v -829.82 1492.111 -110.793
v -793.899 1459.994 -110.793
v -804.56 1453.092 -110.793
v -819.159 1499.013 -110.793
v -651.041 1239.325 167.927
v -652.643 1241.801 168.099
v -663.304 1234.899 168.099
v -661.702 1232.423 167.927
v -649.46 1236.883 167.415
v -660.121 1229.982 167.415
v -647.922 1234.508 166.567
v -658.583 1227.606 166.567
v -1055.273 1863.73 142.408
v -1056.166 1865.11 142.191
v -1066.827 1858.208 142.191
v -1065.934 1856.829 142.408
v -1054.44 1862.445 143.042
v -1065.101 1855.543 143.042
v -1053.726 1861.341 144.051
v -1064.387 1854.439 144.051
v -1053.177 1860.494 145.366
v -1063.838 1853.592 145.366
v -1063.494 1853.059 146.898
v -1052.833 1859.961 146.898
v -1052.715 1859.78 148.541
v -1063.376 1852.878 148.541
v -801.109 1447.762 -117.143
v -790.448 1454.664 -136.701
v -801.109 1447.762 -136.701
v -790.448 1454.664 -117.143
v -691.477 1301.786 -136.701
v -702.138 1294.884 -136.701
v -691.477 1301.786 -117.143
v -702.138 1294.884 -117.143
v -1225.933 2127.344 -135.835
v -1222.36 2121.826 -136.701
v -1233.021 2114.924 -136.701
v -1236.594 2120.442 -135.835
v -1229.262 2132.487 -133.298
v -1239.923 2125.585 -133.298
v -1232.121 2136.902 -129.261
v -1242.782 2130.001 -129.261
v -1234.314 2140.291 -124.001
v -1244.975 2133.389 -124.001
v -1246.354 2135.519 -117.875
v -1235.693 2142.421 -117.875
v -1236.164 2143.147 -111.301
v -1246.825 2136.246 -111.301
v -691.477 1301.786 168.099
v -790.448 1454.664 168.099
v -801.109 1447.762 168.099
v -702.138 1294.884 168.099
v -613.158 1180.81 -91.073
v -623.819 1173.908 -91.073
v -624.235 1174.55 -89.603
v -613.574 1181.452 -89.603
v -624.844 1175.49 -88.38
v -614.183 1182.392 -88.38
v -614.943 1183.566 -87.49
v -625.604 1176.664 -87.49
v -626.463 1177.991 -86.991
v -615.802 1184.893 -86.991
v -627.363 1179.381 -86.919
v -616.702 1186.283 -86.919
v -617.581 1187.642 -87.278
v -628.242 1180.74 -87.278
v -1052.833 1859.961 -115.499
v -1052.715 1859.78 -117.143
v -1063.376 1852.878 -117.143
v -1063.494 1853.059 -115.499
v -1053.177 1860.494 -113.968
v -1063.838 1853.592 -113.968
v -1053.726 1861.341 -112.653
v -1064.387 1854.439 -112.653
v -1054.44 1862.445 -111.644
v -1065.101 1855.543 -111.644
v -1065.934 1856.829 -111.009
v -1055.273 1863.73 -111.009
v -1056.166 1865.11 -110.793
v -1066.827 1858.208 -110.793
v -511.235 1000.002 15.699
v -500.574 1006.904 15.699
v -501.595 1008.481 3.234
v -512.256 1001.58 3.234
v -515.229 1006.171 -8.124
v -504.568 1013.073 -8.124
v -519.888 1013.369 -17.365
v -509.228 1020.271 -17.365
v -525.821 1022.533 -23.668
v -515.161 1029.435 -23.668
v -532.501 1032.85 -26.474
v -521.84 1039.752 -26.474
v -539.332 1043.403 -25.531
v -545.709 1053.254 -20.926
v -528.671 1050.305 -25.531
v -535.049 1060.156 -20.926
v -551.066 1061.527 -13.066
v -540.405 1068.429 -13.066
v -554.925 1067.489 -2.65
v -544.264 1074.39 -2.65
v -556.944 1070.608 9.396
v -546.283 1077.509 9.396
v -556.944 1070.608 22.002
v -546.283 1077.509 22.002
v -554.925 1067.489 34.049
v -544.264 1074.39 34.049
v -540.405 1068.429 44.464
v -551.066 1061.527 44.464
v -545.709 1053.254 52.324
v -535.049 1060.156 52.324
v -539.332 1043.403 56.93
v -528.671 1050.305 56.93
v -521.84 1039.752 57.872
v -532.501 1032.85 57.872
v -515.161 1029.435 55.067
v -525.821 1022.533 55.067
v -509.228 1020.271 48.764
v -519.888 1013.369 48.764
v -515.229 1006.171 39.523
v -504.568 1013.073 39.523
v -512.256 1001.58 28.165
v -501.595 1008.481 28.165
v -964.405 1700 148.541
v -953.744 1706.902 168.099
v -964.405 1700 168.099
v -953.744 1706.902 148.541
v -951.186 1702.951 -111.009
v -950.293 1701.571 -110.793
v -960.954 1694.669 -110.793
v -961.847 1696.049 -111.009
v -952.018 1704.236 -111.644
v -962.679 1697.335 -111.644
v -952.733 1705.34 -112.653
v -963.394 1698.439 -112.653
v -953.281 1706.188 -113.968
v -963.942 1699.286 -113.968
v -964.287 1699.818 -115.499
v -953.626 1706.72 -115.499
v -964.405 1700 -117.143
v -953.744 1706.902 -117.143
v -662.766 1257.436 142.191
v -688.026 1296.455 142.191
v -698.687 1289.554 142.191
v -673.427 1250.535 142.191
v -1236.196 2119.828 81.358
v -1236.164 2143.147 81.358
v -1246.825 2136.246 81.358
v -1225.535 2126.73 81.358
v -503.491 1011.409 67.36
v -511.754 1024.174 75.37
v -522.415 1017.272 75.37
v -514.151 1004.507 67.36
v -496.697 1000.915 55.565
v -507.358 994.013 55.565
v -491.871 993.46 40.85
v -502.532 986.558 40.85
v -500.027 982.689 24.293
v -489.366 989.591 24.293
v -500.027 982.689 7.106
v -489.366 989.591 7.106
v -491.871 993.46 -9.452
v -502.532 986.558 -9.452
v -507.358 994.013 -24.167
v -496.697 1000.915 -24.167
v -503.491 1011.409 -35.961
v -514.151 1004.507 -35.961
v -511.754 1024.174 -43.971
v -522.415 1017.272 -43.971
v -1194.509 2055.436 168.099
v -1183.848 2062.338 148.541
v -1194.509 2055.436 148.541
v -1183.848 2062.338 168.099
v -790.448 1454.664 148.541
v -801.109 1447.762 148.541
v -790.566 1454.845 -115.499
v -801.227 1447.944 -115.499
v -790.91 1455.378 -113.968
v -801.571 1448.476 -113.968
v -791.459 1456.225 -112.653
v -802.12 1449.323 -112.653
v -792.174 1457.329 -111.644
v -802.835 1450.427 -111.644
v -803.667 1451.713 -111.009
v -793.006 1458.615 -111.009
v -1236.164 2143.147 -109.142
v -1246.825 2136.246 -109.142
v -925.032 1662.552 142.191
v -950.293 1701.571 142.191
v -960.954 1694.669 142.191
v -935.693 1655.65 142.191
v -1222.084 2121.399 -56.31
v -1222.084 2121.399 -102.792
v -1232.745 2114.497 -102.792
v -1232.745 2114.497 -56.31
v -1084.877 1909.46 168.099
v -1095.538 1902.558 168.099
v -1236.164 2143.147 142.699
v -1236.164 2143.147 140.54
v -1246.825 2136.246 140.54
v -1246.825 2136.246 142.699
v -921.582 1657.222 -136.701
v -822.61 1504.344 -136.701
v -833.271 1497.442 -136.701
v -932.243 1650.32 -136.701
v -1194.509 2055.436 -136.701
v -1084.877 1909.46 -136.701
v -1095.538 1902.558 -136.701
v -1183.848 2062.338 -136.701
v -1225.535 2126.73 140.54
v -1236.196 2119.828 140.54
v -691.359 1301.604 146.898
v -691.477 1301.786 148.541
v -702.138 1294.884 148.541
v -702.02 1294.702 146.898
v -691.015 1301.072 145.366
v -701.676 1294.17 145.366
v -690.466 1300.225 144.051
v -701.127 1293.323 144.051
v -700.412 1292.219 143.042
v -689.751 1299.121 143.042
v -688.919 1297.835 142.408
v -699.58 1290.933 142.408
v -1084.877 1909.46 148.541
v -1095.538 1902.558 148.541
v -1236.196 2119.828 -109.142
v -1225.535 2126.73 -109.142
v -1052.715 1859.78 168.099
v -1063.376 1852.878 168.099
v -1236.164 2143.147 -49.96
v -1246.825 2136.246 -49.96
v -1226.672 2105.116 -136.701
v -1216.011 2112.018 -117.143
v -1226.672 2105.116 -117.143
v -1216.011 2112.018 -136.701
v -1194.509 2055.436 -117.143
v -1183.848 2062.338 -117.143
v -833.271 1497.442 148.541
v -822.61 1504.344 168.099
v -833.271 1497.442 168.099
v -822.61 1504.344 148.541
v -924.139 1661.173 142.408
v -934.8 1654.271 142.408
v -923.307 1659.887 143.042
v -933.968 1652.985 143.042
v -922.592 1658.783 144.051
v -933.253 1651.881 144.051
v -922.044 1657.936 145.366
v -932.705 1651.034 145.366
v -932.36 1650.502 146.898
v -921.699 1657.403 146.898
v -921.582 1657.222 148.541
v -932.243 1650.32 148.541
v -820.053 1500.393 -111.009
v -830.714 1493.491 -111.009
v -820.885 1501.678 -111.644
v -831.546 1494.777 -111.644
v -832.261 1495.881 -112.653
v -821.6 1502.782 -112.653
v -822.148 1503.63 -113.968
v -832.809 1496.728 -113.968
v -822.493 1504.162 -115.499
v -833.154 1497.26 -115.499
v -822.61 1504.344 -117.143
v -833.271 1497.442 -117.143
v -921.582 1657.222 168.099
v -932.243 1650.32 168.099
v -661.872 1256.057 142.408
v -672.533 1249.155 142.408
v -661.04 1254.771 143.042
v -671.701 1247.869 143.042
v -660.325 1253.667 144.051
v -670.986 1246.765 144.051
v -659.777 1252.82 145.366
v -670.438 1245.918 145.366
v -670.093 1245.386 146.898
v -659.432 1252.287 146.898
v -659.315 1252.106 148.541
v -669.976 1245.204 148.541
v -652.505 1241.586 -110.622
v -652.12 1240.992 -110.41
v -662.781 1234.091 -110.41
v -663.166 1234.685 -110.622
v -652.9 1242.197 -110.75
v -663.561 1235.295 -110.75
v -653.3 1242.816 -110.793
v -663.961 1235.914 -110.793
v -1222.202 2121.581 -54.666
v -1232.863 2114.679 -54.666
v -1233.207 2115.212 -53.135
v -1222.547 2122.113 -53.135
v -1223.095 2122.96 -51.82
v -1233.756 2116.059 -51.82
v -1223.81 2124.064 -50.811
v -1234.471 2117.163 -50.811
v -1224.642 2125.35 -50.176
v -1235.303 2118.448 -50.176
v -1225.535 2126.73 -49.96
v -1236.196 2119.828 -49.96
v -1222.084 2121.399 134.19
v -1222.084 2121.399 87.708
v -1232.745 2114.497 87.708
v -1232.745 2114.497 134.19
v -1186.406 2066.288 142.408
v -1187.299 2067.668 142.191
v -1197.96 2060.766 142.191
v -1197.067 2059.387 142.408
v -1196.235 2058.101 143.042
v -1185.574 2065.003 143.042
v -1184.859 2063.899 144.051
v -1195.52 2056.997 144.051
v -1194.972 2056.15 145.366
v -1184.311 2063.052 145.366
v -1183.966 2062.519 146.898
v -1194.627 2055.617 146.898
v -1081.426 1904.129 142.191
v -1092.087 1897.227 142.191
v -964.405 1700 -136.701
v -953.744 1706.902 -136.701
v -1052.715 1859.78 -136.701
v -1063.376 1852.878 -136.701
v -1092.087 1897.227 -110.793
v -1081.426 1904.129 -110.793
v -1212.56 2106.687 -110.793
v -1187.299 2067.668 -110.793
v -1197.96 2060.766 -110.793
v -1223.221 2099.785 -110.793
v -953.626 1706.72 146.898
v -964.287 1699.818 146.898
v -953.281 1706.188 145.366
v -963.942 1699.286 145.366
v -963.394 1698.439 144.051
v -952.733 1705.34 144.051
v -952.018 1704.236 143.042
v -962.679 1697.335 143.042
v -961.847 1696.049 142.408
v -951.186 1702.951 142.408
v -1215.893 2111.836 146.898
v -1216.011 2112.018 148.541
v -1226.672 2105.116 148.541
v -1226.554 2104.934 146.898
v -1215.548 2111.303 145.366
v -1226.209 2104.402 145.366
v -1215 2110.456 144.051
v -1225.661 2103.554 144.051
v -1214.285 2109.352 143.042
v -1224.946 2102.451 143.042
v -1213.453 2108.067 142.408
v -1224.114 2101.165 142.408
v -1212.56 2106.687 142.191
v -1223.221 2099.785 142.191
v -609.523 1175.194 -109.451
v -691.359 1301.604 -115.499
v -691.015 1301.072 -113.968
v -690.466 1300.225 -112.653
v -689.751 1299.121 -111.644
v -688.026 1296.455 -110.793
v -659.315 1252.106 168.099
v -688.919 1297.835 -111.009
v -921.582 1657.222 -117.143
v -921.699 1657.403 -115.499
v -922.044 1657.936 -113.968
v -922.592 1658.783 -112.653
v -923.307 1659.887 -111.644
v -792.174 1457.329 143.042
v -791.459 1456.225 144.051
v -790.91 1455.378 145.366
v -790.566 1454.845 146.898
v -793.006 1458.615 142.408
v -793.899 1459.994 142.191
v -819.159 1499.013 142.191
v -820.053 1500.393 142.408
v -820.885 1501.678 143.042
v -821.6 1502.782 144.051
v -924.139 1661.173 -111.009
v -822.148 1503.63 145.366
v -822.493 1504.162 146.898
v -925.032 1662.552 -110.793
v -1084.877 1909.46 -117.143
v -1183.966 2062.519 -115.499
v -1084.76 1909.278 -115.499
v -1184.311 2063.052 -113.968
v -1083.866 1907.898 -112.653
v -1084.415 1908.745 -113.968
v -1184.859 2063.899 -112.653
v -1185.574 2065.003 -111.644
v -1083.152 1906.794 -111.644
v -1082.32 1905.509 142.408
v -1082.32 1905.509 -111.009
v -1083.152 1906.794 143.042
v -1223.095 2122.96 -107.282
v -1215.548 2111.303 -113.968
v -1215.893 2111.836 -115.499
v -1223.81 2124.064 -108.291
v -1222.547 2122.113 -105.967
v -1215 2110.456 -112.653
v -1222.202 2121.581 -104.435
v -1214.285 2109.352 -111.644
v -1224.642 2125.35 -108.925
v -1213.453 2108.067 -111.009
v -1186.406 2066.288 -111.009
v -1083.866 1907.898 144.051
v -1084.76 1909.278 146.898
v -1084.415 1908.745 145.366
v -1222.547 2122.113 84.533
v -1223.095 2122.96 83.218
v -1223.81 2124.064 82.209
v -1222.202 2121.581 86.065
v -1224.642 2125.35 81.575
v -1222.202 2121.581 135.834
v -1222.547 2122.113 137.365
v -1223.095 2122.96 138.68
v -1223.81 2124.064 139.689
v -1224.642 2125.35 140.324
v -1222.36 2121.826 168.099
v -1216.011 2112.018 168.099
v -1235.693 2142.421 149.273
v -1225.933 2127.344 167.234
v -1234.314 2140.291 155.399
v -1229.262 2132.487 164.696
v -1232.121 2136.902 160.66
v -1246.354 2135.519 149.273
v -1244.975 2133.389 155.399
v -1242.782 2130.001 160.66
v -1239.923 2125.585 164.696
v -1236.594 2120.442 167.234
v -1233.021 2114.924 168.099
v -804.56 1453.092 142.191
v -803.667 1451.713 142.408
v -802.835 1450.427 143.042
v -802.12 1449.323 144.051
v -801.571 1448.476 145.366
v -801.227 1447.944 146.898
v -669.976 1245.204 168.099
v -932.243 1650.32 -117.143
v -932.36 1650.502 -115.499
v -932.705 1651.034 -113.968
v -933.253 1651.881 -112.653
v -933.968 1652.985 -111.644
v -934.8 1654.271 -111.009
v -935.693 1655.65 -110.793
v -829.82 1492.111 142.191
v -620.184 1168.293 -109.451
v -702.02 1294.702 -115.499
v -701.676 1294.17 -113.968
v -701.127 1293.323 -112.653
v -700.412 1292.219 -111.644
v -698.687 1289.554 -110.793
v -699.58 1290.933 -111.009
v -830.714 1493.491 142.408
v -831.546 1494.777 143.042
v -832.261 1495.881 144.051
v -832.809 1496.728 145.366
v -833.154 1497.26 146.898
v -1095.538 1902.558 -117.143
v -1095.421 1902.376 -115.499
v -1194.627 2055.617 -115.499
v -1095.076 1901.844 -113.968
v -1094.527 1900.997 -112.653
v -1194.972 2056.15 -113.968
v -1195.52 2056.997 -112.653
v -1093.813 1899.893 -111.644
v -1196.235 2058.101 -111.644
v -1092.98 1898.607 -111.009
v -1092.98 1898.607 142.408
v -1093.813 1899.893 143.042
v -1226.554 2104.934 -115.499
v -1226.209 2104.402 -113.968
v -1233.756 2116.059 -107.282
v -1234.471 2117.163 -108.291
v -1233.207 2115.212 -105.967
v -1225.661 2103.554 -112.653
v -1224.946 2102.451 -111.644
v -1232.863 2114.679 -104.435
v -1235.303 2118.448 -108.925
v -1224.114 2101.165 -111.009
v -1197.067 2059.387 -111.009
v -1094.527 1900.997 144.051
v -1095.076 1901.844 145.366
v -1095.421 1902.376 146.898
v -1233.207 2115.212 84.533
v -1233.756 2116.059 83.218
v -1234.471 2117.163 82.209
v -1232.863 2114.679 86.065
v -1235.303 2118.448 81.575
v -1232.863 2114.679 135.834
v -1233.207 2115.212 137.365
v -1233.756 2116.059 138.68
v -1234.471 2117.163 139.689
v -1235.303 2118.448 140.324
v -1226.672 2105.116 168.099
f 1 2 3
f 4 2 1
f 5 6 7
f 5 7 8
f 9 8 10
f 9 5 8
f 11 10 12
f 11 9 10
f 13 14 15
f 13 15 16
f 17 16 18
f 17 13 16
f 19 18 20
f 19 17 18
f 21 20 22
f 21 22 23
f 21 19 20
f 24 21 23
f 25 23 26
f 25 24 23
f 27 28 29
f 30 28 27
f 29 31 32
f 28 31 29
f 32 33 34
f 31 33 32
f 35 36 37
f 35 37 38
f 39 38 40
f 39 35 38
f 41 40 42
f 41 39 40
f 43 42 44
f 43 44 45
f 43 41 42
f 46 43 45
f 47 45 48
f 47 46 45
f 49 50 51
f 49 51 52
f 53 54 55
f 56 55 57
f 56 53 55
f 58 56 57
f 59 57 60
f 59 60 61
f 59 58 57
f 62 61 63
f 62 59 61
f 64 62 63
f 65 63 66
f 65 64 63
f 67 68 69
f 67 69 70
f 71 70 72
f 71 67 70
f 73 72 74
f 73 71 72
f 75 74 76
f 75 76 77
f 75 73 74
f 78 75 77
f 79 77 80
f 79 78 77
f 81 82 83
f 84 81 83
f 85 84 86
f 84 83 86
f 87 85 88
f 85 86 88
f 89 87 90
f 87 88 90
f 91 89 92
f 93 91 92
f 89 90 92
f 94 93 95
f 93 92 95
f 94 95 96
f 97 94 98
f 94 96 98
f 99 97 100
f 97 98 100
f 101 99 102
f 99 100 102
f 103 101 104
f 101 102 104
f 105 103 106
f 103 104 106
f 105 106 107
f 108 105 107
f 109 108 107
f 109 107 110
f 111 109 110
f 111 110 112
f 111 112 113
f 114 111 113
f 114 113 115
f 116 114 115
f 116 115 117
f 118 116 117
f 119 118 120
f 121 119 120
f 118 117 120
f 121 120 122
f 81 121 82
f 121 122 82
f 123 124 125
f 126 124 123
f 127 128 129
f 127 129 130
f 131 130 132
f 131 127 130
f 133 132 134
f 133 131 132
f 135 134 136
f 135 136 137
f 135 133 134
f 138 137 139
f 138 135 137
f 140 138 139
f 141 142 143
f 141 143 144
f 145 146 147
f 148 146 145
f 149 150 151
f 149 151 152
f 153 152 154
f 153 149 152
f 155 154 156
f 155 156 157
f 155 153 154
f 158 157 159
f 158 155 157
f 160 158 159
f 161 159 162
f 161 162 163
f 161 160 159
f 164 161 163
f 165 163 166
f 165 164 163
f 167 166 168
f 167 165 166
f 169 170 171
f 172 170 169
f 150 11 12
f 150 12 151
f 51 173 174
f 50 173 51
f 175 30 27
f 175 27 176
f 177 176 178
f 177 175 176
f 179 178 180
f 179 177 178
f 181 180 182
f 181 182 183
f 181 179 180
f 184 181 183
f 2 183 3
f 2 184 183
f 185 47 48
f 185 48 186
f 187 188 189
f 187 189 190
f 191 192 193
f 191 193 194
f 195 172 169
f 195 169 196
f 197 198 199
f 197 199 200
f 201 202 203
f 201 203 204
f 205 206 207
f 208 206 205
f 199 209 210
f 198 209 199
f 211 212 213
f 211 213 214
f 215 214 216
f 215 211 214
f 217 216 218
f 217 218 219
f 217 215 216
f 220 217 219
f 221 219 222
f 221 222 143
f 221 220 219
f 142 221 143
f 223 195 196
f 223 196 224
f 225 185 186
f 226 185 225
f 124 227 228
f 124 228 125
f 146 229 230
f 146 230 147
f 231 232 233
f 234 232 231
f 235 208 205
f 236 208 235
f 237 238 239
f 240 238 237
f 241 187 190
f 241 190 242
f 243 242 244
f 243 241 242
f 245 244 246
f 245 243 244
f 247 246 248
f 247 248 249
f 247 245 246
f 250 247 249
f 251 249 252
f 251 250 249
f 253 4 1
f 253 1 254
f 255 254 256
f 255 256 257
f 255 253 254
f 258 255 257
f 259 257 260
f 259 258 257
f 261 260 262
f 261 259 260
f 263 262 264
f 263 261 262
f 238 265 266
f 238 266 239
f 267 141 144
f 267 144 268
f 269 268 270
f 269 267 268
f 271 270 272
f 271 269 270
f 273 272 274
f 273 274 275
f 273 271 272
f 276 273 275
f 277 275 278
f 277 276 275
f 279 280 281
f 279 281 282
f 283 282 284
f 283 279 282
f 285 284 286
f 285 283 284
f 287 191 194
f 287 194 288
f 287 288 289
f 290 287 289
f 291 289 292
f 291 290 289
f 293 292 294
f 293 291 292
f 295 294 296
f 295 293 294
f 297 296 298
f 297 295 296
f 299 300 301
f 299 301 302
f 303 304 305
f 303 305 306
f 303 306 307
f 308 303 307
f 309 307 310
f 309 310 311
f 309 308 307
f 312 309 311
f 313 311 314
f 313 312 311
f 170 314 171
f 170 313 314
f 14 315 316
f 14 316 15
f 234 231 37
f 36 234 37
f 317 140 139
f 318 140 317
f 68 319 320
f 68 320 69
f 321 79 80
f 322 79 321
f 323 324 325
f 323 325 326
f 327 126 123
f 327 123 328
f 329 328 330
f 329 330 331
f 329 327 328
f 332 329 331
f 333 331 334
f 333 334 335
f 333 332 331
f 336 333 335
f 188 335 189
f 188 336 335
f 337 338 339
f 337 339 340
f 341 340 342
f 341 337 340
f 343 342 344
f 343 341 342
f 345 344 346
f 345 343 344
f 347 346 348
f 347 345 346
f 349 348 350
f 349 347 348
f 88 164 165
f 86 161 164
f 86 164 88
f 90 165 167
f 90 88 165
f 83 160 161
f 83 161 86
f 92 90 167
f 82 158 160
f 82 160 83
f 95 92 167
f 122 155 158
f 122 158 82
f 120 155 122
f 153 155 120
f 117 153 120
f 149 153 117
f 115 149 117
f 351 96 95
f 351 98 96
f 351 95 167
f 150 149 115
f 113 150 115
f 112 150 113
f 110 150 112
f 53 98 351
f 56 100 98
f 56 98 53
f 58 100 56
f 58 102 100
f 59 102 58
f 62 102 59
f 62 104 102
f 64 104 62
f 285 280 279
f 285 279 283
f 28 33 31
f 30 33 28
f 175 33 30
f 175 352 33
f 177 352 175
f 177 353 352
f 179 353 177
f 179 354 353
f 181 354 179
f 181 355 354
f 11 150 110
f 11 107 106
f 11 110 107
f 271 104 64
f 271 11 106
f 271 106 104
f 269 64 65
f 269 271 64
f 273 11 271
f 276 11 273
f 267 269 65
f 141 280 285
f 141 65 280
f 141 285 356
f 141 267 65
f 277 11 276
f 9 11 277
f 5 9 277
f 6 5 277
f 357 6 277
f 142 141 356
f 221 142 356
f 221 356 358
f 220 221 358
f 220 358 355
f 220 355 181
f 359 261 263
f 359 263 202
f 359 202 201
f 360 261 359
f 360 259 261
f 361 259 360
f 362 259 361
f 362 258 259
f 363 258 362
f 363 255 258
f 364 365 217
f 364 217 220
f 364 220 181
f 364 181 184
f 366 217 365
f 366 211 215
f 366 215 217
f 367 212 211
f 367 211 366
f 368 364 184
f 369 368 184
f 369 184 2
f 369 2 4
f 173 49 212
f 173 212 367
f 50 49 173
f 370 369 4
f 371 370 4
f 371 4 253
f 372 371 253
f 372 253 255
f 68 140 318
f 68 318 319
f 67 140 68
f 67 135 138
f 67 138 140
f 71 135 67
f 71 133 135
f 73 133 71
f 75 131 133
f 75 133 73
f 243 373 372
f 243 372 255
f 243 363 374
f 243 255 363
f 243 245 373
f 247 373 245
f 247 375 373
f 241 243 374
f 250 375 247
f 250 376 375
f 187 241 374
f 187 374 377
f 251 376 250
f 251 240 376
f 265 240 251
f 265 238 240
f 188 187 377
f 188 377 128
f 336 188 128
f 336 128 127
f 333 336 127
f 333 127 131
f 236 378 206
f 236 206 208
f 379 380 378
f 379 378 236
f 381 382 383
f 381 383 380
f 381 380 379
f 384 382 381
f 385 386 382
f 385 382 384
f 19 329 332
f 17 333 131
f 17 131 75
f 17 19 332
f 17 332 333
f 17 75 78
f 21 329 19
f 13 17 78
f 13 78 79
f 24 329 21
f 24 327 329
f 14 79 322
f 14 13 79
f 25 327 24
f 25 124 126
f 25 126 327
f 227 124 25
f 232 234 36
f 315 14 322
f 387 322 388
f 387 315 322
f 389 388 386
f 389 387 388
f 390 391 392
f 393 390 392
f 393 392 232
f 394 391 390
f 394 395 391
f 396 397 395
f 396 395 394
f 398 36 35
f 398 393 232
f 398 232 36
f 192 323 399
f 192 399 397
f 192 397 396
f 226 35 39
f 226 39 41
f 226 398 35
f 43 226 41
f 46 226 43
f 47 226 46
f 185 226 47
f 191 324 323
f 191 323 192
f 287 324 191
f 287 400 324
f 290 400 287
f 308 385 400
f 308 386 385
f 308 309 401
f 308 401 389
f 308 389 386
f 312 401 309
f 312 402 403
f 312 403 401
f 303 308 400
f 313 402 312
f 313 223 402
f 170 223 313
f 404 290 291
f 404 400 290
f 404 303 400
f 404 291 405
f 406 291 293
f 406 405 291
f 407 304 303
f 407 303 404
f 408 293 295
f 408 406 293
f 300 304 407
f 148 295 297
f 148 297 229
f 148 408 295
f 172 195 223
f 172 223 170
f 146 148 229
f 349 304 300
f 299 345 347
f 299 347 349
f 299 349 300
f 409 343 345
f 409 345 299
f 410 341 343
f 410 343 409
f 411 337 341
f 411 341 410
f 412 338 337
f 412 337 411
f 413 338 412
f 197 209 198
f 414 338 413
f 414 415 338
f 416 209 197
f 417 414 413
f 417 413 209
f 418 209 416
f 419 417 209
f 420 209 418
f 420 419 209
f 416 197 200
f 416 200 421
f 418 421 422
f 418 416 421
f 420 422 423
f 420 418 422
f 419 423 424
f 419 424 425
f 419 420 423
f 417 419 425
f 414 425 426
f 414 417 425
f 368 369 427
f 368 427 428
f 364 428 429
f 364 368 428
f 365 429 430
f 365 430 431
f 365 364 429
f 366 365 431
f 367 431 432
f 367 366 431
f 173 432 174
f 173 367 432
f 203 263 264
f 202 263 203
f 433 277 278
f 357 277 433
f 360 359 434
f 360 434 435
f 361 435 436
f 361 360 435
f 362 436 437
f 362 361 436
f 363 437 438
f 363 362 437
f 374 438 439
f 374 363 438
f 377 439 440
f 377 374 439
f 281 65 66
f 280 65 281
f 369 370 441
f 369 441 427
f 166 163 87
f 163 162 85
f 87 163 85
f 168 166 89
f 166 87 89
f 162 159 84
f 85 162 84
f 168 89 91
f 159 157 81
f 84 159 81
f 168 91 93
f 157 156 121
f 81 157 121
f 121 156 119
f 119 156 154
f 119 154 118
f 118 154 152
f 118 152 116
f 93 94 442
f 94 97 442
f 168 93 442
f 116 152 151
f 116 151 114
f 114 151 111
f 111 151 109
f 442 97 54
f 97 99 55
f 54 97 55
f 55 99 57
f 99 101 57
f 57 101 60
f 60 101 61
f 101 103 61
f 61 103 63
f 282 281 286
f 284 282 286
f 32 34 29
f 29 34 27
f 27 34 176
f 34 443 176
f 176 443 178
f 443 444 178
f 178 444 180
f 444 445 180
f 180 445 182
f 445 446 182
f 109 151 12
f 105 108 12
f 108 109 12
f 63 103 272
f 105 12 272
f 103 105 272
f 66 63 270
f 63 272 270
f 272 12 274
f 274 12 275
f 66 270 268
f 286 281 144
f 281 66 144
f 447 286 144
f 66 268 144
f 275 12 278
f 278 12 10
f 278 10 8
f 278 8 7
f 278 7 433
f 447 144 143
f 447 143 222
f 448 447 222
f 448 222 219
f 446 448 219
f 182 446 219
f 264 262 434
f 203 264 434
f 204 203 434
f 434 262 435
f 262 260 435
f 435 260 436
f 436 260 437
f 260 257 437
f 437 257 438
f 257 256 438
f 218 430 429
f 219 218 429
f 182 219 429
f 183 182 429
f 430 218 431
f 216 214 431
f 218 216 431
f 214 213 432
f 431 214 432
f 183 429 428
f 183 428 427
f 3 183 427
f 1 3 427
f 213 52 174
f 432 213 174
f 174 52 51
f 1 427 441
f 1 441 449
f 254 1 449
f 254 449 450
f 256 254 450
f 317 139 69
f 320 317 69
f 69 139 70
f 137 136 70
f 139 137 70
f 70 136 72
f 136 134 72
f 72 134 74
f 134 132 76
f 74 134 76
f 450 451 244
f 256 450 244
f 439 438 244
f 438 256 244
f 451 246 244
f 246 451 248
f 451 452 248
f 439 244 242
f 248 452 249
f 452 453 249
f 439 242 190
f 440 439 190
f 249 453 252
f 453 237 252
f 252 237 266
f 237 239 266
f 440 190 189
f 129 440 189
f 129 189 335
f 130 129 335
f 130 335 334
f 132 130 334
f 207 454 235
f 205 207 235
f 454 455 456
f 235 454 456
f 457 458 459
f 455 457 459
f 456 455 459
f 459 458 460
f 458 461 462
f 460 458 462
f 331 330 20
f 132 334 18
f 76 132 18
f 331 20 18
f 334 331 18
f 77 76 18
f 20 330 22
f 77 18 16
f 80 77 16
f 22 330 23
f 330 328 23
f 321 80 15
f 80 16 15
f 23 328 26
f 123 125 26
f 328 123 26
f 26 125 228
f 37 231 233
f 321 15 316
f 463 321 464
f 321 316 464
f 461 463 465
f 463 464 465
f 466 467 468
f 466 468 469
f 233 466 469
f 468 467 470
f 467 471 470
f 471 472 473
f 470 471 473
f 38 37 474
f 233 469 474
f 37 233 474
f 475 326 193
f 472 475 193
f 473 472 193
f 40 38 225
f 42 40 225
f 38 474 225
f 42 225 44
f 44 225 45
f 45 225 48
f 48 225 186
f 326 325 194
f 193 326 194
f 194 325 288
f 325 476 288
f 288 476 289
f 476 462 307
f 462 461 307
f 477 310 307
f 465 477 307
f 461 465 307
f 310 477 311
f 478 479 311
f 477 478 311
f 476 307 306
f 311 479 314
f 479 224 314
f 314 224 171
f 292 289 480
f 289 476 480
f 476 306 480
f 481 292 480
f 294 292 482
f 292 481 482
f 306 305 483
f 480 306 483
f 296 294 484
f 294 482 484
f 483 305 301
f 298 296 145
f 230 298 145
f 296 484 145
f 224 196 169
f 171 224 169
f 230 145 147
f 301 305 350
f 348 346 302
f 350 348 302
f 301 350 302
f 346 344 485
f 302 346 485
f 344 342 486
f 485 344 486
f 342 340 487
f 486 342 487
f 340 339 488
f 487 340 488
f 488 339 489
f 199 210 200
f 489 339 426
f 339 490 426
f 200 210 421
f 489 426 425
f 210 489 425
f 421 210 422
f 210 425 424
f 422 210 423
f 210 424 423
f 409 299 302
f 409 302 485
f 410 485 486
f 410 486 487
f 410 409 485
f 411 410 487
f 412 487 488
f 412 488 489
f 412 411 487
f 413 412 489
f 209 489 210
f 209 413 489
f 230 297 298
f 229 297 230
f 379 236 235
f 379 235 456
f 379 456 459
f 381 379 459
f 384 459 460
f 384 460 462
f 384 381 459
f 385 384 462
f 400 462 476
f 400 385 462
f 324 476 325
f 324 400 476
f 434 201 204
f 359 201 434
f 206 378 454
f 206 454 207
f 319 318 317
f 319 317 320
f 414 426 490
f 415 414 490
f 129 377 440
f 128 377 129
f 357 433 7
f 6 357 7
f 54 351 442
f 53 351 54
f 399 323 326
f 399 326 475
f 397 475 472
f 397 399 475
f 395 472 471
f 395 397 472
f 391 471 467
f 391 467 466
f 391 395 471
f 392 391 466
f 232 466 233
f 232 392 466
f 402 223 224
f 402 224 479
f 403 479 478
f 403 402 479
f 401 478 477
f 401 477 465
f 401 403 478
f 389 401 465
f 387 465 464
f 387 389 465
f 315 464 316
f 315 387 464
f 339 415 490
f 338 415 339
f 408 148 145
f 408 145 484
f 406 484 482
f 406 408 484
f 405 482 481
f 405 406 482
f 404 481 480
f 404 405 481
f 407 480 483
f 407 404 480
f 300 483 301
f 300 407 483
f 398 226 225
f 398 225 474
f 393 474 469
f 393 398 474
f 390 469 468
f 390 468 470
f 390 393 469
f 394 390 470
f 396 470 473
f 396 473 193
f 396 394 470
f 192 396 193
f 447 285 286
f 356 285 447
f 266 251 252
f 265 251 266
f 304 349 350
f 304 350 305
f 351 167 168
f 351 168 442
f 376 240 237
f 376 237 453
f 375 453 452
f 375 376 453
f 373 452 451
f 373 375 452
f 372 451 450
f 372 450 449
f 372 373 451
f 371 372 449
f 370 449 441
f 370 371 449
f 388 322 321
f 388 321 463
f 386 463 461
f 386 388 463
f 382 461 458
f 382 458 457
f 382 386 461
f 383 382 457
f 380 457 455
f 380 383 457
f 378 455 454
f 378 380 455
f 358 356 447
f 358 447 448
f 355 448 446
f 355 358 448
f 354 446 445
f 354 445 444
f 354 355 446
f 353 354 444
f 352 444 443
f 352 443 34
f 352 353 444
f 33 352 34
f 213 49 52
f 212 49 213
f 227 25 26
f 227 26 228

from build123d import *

# Parameters (mm, degrees)
SKETCH1_R           = 42.291
BOSS_EXTRUDE1_DEPTH = 12.7


with BuildPart() as part:
    # Sketch1 → Boss-Extrude1 (new body)
    with BuildSketch(Plane(origin=(106.603890681, 69.014006689, 0), x_dir=(-0.543445635, 0.839444365, 0), z_dir=(0.839444365, 0.543445635, 0))):
        with BuildLine():
            Line((2433.75688, -117.142768), (2433.75688, -136.700768))
            Line((2433.75688, -136.700768), (2445.44088, -136.700768))
            ThreePointArc((2445.44088, -136.700768), (2463.401392242, -129.261280242), (2470.84088, -111.300768))
            Line((2470.84088, -111.300768), (2470.84088, -109.141768))
            Line((2470.84088, -109.141768), (2451.28288, -109.141768))
            ThreePointArc((2451.28288, -109.141768), (2446.792751939, -107.28189606), (2444.93288, -102.791768))
            Line((2444.93288, -102.791768), (2444.93288, -56.309772))
            ThreePointArc((2444.93288, -56.309772), (2446.792751939, -51.819643939), (2451.28288, -49.959772))
            Line((2451.28288, -49.959772), (2470.84088, -49.959772))
            Line((2470.84088, -49.959772), (2470.84088, 81.358228))
            Line((2470.84088, 81.358228), (2451.28288, 81.358228))
            ThreePointArc((2451.28288, 81.358228), (2446.792751939, 83.21809994), (2444.93288, 87.708228))
            Line((2444.93288, 87.708228), (2444.93288, 134.190232))
            ThreePointArc((2444.93288, 134.190232), (2446.792751939, 138.680360061), (2451.28288, 140.540232))
            Line((2451.28288, 140.540232), (2470.84088, 140.540232))
            Line((2470.84088, 140.540232), (2470.84088, 142.699232))
            ThreePointArc((2470.84088, 142.699232), (2463.401392242, 160.659744242), (2445.44088, 168.099232))
            Line((2445.44088, 168.099232), (2433.75688, 168.099232))
            Line((2433.75688, 168.099232), (2433.75688, 148.541232))
            ThreePointArc((2433.75688, 148.541232), (2431.897008061, 144.051103939), (2427.40688, 142.191232))
            Line((2427.40688, 142.191232), (2380.92488, 142.191232))
            ThreePointArc((2380.92488, 142.191232), (2376.434751939, 144.051103939), (2374.57488, 148.541232))
            Line((2374.57488, 148.541232), (2374.57488, 168.099232))
            Line((2374.57488, 168.099232), (2192.45688, 168.099232))
            Line((2192.45688, 168.099232), (2192.45688, 148.541232))
            ThreePointArc((2192.45688, 148.541232), (2190.597008061, 144.051103939), (2186.10688, 142.191232))
            Line((2186.10688, 142.191232), (2139.62488, 142.191232))
            ThreePointArc((2139.62488, 142.191232), (2135.134751939, 144.051103939), (2133.27488, 148.541232))
            Line((2133.27488, 148.541232), (2133.27488, 168.099232))
            Line((2133.27488, 168.099232), (1951.15688, 168.099232))
            Line((1951.15688, 168.099232), (1951.15688, 148.541232))
            ThreePointArc((1951.15688, 148.541232), (1949.297008061, 144.051103939), (1944.80688, 142.191232))
            Line((1944.80688, 142.191232), (1898.32488, 142.191232))
            ThreePointArc((1898.32488, 142.191232), (1893.834751939, 144.051103939), (1891.97488, 148.541232))
            Line((1891.97488, 148.541232), (1891.97488, 168.099232))
            Line((1891.97488, 168.099232), (1709.85688, 168.099232))
            Line((1709.85688, 168.099232), (1709.85688, 148.541232))
            ThreePointArc((1709.85688, 148.541232), (1707.997008061, 144.051103939), (1703.50688, 142.191232))
            Line((1703.50688, 142.191232), (1657.02488, 142.191232))
            ThreePointArc((1657.02488, 142.191232), (1652.534751939, 144.051103939), (1650.67488, 148.541232))
            Line((1650.67488, 148.541232), (1650.67488, 168.099232))
            Line((1650.67488, 168.099232), (1468.55688, 168.099232))
            Line((1468.55688, 168.099232), (1468.55688, 148.541232))
            ThreePointArc((1468.55688, 148.541232), (1466.697008061, 144.051103939), (1462.20688, 142.191232))
            Line((1462.20688, 142.191232), (1415.72488, 142.191232))
            ThreePointArc((1415.72488, 142.191232), (1411.234751939, 144.051103939), (1409.37488, 148.541232))
            Line((1409.37488, 148.541232), (1409.37488, 168.099232))
            Line((1409.37488, 168.099232), (1397.098564625, 168.099232))
            ThreePointArc((1397.098564625, 168.099232), (1392.687900912, 167.713348927), (1388.411252984, 166.567424568))
            Line((1388.411252984, 166.567424568), (1137.847600899, 75.36971342))
            ThreePointArc((1137.847600899, 75.36971342), (1096.06588, 15.699232), (1137.847600899, -43.97124942))
            Line((1137.847600899, -43.97124942), (1317.752937975, -109.451437101))
            Line((1317.752937975, -109.451437101), (1324.442167938, -91.072928824))
            ThreePointArc((1324.442167938, -91.072928824), (1327.725590118, -87.489702286), (1332.58104399, -87.277708592))
            Line((1332.58104399, -87.277708592), (1396.135987148, -110.409816142))
            ThreePointArc((1396.135987148, -110.409816142), (1397.20514913, -110.696297232), (1398.307815058, -110.792768))
            Line((1398.307815058, -110.792768), (1462.20688, -110.792768))
            ThreePointArc((1462.20688, -110.792768), (1466.697008061, -112.652639939), (1468.55688, -117.142768))
            Line((1468.55688, -117.142768), (1468.55688, -136.700768))
            Line((1468.55688, -136.700768), (1650.67488, -136.700768))
            Line((1650.67488, -136.700768), (1650.67488, -117.142768))
            ThreePointArc((1650.67488, -117.142768), (1652.534751939, -112.652639939), (1657.02488, -110.792768))
            Line((1657.02488, -110.792768), (1703.50688, -110.792768))
            ThreePointArc((1703.50688, -110.792768), (1707.997008061, -112.652639939), (1709.85688, -117.142768))
            Line((1709.85688, -117.142768), (1709.85688, -136.700768))
            Line((1709.85688, -136.700768), (1891.97488, -136.700768))
            Line((1891.97488, -136.700768), (1891.97488, -117.142768))
            ThreePointArc((1891.97488, -117.142768), (1893.834751939, -112.652639939), (1898.32488, -110.792768))
            Line((1898.32488, -110.792768), (1944.80688, -110.792768))
            ThreePointArc((1944.80688, -110.792768), (1949.297008061, -112.652639939), (1951.15688, -117.142768))
            Line((1951.15688, -117.142768), (1951.15688, -136.700768))
            Line((1951.15688, -136.700768), (2133.27488, -136.700768))
            Line((2133.27488, -136.700768), (2133.27488, -117.142768))
            ThreePointArc((2133.27488, -117.142768), (2135.134751939, -112.652639939), (2139.62488, -110.792768))
            Line((2139.62488, -110.792768), (2186.10688, -110.792768))
            ThreePointArc((2186.10688, -110.792768), (2190.597008061, -112.652639939), (2192.45688, -117.142768))
            Line((2192.45688, -117.142768), (2192.45688, -136.700768))
            Line((2192.45688, -136.700768), (2374.57488, -136.700768))
            Line((2374.57488, -136.700768), (2374.57488, -117.142768))
            ThreePointArc((2374.57488, -117.142768), (2376.434751939, -112.652639939), (2380.92488, -110.792768))
            Line((2380.92488, -110.792768), (2427.40688, -110.792768))
            ThreePointArc((2427.40688, -110.792768), (2431.897008061, -112.652639939), (2433.75688, -117.142768))
        make_face()
        with Locations(Location((1159.56588, 15.699232, 0), (0, 0, 180))):  # turned: the seam where the file's is
            Circle(SKETCH1_R, mode=Mode.SUBTRACT)
    extrude(amount=-BOSS_EXTRUDE1_DEPTH)


solid = part.part
